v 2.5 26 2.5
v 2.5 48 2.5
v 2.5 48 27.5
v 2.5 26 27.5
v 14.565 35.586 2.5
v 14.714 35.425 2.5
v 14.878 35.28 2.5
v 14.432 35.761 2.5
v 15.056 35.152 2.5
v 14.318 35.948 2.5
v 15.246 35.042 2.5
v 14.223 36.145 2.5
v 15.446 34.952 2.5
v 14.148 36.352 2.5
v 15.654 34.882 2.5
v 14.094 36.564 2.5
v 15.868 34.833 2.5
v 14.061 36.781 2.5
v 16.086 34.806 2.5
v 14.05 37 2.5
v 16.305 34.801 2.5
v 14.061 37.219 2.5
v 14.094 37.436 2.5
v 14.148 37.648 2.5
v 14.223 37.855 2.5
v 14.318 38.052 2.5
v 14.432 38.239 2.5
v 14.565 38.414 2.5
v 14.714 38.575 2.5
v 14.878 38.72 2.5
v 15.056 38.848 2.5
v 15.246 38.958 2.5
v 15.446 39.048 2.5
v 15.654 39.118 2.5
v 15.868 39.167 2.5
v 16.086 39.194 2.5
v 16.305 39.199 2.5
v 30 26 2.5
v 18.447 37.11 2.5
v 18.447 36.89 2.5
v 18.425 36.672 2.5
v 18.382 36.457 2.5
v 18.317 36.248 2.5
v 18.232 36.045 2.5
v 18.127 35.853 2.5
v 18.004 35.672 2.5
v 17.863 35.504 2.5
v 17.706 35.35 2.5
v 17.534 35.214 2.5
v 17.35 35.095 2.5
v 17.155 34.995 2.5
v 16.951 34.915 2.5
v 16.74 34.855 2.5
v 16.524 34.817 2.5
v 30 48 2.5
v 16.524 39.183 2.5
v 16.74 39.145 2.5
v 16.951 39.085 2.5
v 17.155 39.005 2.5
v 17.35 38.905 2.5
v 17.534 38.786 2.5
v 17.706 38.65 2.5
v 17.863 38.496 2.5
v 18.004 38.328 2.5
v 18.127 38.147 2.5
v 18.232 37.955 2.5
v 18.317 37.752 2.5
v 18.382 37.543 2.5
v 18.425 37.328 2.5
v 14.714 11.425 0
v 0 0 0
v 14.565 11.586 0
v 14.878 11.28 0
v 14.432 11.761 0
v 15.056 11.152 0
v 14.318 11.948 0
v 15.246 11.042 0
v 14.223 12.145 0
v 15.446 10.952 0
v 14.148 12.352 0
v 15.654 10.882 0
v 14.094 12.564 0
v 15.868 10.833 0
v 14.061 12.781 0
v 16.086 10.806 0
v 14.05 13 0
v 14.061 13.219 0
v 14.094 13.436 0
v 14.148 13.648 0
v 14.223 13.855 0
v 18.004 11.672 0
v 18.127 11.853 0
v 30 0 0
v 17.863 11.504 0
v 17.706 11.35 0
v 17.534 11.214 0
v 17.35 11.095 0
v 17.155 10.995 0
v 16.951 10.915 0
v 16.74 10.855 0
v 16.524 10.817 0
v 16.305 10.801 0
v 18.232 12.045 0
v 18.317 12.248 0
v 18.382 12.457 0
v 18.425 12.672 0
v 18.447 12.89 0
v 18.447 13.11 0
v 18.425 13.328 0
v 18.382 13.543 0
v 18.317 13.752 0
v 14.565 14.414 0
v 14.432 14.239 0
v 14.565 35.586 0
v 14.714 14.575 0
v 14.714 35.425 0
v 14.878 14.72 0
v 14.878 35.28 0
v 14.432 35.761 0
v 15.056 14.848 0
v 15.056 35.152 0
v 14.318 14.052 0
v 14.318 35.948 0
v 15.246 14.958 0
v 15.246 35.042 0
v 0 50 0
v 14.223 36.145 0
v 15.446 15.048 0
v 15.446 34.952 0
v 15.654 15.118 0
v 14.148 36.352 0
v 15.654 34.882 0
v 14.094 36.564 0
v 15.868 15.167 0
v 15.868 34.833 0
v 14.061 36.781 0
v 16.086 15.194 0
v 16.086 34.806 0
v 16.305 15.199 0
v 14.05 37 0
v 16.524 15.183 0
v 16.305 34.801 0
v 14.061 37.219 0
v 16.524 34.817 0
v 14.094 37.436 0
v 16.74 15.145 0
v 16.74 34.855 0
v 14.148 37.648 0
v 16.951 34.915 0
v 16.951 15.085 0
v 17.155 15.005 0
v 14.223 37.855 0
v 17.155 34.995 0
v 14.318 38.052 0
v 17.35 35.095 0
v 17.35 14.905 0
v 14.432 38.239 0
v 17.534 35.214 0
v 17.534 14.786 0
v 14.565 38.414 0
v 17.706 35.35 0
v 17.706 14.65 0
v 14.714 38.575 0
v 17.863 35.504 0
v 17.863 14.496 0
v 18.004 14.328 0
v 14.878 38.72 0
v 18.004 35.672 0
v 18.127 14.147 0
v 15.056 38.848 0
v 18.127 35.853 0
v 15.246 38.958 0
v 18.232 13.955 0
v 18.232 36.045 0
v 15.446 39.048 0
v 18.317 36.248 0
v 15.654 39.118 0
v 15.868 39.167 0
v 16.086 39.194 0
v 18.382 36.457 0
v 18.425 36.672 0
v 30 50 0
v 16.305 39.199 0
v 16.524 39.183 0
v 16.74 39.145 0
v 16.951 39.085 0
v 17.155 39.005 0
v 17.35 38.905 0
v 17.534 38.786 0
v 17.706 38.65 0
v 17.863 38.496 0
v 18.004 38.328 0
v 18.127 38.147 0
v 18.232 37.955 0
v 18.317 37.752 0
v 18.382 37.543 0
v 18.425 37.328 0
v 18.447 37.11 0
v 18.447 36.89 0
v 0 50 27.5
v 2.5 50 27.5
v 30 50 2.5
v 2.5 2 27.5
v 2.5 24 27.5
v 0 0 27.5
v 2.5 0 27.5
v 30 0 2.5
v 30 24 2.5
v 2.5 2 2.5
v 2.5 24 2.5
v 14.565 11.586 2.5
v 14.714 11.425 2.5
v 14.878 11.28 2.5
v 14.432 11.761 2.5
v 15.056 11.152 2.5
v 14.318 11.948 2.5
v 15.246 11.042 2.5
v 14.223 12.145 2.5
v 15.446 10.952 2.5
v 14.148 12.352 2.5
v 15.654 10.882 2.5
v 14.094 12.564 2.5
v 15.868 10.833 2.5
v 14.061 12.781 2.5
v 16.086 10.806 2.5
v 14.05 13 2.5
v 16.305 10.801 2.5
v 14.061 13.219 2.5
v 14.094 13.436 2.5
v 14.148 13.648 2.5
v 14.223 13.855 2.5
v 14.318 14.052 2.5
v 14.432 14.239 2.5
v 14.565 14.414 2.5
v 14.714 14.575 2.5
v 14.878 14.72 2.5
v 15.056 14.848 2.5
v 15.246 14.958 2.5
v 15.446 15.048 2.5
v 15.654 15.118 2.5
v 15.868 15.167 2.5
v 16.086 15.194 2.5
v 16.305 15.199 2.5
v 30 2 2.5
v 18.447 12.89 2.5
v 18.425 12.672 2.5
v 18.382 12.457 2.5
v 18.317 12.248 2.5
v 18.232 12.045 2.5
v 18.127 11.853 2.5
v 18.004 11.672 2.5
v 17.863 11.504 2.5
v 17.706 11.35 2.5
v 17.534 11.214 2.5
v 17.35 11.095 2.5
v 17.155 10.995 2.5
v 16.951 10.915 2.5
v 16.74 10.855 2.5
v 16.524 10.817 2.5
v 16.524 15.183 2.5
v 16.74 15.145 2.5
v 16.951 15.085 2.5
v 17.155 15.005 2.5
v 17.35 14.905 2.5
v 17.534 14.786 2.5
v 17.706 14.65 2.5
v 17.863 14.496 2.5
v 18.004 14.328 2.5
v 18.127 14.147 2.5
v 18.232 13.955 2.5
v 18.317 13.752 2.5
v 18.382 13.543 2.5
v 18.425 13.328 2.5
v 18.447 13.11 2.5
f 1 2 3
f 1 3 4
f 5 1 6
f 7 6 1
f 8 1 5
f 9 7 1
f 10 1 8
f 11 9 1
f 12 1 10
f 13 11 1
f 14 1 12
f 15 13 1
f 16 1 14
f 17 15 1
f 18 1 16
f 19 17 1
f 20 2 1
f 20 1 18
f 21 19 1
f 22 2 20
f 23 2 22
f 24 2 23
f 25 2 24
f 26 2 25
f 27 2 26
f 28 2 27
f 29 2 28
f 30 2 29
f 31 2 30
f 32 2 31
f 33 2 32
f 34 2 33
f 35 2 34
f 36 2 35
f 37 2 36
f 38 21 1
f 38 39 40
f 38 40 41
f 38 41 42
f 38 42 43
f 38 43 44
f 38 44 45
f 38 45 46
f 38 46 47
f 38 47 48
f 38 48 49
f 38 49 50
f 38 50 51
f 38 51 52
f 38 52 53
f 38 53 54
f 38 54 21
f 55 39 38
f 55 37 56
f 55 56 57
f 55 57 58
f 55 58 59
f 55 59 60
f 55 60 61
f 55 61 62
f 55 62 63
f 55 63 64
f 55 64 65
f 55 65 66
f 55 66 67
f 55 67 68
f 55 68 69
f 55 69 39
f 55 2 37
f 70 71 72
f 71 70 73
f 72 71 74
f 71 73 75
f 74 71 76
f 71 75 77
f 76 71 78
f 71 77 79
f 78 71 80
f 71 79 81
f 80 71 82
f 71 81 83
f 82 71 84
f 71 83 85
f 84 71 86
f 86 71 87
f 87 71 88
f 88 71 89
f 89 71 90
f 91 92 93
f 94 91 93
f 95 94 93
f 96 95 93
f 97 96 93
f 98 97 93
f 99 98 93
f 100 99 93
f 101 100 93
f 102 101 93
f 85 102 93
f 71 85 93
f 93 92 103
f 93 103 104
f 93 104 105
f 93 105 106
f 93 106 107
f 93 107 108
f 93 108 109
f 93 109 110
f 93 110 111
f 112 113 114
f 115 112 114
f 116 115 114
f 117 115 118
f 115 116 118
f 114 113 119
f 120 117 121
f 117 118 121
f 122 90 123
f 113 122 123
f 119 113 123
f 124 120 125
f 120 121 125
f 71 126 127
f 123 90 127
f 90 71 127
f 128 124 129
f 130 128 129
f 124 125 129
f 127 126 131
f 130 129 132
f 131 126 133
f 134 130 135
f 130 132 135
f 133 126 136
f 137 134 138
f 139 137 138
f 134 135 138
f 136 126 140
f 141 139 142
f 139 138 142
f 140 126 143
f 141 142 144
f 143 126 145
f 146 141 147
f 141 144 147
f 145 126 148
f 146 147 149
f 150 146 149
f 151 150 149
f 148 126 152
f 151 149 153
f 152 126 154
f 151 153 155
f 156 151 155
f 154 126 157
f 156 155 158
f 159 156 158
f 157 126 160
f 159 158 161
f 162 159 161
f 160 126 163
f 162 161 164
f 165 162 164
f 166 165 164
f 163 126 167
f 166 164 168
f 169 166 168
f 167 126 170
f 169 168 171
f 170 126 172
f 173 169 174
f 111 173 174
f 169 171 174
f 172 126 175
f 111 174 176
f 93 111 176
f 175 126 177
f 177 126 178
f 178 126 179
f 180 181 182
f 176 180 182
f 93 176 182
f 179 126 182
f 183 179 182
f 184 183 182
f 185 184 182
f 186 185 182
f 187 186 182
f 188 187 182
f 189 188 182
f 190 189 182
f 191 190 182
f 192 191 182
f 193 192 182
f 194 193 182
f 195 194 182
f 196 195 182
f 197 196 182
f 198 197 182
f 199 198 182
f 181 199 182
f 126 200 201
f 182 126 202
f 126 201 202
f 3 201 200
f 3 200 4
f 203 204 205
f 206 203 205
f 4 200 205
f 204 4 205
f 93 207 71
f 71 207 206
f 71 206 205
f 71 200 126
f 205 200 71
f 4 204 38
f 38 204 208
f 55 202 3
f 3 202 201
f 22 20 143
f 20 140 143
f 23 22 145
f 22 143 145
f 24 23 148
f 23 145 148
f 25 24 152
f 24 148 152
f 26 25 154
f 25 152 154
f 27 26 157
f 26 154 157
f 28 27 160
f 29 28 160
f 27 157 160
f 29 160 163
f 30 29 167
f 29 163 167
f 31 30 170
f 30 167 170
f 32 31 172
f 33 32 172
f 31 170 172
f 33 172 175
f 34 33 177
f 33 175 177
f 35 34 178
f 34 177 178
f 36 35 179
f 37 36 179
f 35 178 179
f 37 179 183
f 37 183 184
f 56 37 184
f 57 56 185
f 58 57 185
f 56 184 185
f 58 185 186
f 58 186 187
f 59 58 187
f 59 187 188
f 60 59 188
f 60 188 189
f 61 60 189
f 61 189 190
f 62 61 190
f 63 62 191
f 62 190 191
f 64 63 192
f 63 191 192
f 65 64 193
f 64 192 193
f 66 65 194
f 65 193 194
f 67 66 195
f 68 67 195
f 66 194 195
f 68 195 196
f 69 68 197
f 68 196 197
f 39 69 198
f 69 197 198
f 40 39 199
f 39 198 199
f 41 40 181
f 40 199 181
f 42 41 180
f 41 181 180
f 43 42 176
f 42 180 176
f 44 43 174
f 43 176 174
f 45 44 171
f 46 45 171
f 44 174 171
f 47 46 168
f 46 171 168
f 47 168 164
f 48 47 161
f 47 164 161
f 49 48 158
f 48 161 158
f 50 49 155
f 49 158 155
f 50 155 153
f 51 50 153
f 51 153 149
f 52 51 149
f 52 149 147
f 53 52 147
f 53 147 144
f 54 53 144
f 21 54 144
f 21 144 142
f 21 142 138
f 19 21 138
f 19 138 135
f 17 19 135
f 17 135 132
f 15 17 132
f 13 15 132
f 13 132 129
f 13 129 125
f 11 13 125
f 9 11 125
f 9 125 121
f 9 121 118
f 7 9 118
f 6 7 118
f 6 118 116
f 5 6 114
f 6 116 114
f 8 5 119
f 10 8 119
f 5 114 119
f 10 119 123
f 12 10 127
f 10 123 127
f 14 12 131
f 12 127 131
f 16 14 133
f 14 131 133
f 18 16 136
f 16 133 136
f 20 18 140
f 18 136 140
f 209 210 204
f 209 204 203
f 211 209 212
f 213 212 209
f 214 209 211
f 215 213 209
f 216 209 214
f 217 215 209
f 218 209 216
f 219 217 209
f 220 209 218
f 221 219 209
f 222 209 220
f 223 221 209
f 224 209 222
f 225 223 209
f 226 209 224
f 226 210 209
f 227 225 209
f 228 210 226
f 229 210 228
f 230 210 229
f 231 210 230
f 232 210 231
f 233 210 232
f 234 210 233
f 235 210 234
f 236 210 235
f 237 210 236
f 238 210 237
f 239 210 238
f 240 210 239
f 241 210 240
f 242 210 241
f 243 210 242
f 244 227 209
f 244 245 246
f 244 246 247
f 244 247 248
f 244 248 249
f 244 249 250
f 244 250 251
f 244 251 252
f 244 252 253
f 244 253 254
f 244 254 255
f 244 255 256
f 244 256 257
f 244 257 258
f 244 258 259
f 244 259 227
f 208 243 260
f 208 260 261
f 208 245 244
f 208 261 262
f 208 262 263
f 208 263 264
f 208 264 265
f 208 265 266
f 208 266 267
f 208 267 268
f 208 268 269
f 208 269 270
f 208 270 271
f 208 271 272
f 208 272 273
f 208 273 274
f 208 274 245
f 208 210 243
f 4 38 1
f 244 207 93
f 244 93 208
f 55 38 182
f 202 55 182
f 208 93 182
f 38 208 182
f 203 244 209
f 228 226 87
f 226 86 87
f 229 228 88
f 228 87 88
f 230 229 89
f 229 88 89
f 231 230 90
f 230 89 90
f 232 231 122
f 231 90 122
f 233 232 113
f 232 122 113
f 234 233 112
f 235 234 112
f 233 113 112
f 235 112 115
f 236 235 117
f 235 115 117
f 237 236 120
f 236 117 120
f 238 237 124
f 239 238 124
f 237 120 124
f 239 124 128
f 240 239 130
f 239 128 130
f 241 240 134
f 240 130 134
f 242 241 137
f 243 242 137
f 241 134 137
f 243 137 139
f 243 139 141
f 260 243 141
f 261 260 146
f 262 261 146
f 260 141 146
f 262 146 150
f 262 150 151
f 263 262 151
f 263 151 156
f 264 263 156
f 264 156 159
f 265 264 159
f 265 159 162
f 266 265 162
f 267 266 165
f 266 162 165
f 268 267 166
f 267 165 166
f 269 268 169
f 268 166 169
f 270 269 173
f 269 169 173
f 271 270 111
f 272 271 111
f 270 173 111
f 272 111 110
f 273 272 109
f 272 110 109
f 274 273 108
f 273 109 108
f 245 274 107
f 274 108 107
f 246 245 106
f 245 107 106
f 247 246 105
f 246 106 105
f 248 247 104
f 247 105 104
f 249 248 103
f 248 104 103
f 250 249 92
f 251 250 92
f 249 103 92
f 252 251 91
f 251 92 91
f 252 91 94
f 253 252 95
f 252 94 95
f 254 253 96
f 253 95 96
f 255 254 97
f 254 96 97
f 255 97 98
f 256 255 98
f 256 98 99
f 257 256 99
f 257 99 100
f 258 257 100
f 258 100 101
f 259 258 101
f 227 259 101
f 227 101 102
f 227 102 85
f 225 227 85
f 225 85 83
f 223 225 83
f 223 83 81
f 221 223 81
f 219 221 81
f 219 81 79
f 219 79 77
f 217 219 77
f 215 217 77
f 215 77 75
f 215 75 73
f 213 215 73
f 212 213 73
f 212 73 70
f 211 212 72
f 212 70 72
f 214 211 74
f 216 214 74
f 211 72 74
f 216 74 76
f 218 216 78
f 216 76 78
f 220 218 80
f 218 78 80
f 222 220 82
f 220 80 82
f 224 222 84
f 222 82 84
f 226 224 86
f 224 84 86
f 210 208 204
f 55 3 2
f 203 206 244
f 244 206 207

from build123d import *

# Parameters (mm, degrees)
SKETCH_W         = 30
SKETCH_H         = 50
PAD_DEPTH        = 2.5
SKETCH001_W      = 50
SKETCH001_H      = 25
PAD001_DEPTH     = 2.5
PAD002_DEPTH     = 2
PAD003_DEPTH     = 1
PAD004_DEPTH     = 2
HOLE_D           = 4.4
HOLE_DEPTH       = 25
HOLE_CSINK_D     = 8
HOLE_CSINK_ANGLE = 90


with BuildPart() as part:
    # Sketch → Pad (new body)
    with BuildSketch(Plane.XY):
        with Locations((15, 25)):
            Rectangle(SKETCH_W, SKETCH_H)
    extrude(amount=PAD_DEPTH)

    # Sketch001 → Pad001 (join)
    with BuildSketch(Plane(origin=(0, 0, 0), x_dir=(0, -1, 0), z_dir=(-1, 0, 0))):
        with Locations((-25, 15)):
            Rectangle(SKETCH001_W, SKETCH001_H)
    extrude(amount=-PAD001_DEPTH)

    # Sketch002 → Pad002 (join)
    with BuildSketch(Plane.XZ):
        Polygon((2.5, 2.5), (2.5, 27.5), (30, 2.5), align=None)
    extrude(amount=-PAD002_DEPTH)

    # Sketch003 → Pad003 (join, symmetric)
    with BuildSketch(Plane.XZ.offset(-25)):
        Polygon((2.5, 2.5), (2.5, 27.5), (30, 2.5), align=None)
    extrude(amount=PAD003_DEPTH, both=True)

    # Sketch004 → Pad004 (join)
    with BuildSketch(Plane.XZ.offset(-50)):
        Polygon((2.5, 27.5), (2.5, 2.5), (30, 2.5), align=None)
    extrude(amount=PAD004_DEPTH)

    # Hole
    with Locations(Plane.XY.offset(5)):
        with Locations((16.25, 37), (16.25, 13)):
            CounterSinkHole(HOLE_D / 2, HOLE_CSINK_D / 2, depth=HOLE_DEPTH, counter_sink_angle=HOLE_CSINK_ANGLE)


solid = part.part
